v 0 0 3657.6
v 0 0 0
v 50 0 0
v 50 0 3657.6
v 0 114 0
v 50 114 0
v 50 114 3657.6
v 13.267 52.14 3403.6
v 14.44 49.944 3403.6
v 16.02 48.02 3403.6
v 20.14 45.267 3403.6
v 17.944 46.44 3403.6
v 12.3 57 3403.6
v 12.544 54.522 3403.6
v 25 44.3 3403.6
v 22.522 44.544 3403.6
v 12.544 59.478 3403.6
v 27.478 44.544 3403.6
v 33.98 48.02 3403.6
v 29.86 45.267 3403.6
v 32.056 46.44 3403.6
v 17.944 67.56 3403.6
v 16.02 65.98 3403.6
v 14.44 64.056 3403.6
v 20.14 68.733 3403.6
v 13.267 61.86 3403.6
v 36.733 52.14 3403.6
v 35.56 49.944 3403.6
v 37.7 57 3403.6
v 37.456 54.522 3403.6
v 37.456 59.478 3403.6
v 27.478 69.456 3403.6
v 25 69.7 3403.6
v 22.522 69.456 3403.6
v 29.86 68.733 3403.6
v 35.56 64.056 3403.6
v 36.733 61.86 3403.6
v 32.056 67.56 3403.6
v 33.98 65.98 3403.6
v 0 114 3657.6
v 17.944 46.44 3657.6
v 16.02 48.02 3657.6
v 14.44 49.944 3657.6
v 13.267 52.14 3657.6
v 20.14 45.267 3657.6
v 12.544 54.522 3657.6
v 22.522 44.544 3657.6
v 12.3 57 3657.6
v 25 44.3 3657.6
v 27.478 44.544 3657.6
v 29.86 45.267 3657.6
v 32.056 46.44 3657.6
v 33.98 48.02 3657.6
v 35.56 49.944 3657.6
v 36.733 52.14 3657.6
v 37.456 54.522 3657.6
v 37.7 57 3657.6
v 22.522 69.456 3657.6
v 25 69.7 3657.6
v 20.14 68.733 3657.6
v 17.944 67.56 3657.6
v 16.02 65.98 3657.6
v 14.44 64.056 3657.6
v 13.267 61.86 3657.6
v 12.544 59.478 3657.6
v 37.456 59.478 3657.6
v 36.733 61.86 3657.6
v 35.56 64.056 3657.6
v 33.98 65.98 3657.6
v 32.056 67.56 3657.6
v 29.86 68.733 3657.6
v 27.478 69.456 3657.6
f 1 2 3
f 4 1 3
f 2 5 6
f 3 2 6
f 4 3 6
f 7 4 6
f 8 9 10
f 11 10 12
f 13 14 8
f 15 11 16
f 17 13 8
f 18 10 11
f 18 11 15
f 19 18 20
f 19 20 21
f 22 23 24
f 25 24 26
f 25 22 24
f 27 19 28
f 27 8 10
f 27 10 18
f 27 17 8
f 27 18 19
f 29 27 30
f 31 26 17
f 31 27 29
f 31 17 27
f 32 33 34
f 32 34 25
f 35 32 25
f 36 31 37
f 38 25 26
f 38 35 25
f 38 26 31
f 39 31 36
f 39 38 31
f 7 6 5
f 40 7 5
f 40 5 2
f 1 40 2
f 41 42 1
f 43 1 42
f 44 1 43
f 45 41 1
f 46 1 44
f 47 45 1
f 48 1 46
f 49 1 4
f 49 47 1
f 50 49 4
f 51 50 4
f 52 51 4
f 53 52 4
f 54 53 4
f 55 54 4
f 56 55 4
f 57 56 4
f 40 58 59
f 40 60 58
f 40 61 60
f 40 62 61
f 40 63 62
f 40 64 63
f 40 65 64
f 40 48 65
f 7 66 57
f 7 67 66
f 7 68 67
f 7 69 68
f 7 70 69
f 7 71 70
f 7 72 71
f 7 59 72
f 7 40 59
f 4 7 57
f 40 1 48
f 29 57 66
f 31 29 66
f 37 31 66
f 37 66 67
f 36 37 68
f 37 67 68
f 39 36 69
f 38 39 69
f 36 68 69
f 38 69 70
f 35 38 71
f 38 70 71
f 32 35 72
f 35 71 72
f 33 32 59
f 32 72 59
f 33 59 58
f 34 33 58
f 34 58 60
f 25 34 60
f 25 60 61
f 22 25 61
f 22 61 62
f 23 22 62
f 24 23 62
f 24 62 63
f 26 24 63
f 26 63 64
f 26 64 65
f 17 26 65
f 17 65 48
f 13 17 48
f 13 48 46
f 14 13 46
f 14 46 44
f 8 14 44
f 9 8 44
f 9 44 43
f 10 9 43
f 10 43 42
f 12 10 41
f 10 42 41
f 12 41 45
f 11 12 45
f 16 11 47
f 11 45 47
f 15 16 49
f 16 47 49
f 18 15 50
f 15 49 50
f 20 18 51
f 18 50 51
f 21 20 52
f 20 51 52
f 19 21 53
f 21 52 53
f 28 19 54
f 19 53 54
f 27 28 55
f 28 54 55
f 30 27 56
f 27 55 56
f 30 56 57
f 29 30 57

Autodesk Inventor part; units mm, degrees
ref_plane "YZ Plane" through (0, 0, 0) normal (1, 0, 0) x (0, 1, 0)
ref_plane "XZ Plane" through (0, 0, 0) normal (0, 1, 0) x (-1, 0, 0)
ref_plane "XY Plane" through (0, 0, 0) normal (0, 0, 1) x (1, 0, 0)
sketch "Sketch1" plane through (0, 0, 0) normal (0, 0, 1) x (1, 0, 0)
  line L0 (0, 0) -> (50, 0)
  line L1 (50, 0) -> (50, 114)
  line L2 (50, 114) -> (0, 114)
  line L3 (0, 114) -> (0, 0)
  dimension "d0" = 50
  dimension "d1" = 114
extrude "Extrusion1" add sketch "Sketch1" along normal blind 3657.6
sketch "Sketch4" plane through (0, 0, 3657.6) normal (0, 0, 1) x (1, 0, 0)
  circle A0 centre (25, 57) radius 12.7
  line L0 (0, 0) -> (50, 0) projected
  line L1 (50, 0) -> (50, 114) projected
  line L2 (50, 114) -> (0, 114) projected
  line L3 (0, 114) -> (0, 0) projected
  line L4 (25, 114) -> (25, 0) construction
  line L5 (0, 57) -> (50, 57) construction
  point P0 (25, 57)
  dimension "d16" = 25.4
extrude "Extrusion4" cut sketch "Sketch4" against normal blind 254 contours A0
properties part number "2p3post" material "Wood (Walnut)"
